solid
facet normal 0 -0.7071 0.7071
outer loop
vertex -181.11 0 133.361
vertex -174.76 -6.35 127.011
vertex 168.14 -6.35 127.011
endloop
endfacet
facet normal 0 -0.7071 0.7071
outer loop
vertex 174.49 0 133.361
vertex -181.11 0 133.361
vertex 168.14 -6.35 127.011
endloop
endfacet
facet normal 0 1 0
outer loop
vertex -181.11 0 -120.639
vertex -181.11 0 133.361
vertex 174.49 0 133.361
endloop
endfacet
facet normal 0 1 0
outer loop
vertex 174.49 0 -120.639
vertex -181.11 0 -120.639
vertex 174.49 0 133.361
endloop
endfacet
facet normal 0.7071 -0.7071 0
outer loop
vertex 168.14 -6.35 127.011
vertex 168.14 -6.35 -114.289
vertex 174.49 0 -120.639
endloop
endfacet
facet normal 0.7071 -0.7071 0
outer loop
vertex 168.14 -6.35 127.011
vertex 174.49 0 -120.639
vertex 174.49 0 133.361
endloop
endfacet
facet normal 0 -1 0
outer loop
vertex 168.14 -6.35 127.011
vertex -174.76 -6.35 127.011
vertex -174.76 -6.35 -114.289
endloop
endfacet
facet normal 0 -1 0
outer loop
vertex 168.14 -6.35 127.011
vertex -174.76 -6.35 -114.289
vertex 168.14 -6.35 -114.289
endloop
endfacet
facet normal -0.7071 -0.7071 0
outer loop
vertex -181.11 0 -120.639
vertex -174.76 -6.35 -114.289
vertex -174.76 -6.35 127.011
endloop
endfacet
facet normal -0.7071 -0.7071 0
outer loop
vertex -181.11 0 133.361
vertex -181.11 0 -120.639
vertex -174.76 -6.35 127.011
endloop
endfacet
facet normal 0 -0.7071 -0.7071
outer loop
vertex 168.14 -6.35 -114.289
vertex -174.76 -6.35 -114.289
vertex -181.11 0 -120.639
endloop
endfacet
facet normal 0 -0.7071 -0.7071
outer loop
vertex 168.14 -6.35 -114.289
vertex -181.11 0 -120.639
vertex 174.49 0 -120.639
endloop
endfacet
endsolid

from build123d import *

# Parameters (mm, degrees)
F0_W     = 355.6
F0_H     = 254
F1_DEPTH = 6.35
F2_SIZE2 = 6.34999
F2_SIZE  = 6.34999


# Not quite as in the source:
# - a fillet or chamfer is up to 0.001 mm smaller than in the source, because OpenCascade refuses the exact size


with BuildPart() as f1:
    # F0 (on Front) → F1 (new body)
    with BuildSketch(Plane.XZ):
        with Locations((-3.309763968, 6.3614202906)):
            Rectangle(F0_W, F0_H)
    extrude(amount=F1_DEPTH)

    # F2 (size 6.35 and 6.35 in the source; OpenCascade refuses exactly that, so slightly less here)
    f2_edges = [f1.edges().sort_by_distance(p)[0] for p in [
        (-3.309764, -6.35, 133.36142),
        (-181.109764, -6.35, 6.36142),
        (-3.309764, -6.35, -120.63858),
        (174.490236, -6.35, 6.36142),
    ]]
    chamfer(f2_edges, length=F2_SIZE, length2=F2_SIZE2)


solid = f1.part
